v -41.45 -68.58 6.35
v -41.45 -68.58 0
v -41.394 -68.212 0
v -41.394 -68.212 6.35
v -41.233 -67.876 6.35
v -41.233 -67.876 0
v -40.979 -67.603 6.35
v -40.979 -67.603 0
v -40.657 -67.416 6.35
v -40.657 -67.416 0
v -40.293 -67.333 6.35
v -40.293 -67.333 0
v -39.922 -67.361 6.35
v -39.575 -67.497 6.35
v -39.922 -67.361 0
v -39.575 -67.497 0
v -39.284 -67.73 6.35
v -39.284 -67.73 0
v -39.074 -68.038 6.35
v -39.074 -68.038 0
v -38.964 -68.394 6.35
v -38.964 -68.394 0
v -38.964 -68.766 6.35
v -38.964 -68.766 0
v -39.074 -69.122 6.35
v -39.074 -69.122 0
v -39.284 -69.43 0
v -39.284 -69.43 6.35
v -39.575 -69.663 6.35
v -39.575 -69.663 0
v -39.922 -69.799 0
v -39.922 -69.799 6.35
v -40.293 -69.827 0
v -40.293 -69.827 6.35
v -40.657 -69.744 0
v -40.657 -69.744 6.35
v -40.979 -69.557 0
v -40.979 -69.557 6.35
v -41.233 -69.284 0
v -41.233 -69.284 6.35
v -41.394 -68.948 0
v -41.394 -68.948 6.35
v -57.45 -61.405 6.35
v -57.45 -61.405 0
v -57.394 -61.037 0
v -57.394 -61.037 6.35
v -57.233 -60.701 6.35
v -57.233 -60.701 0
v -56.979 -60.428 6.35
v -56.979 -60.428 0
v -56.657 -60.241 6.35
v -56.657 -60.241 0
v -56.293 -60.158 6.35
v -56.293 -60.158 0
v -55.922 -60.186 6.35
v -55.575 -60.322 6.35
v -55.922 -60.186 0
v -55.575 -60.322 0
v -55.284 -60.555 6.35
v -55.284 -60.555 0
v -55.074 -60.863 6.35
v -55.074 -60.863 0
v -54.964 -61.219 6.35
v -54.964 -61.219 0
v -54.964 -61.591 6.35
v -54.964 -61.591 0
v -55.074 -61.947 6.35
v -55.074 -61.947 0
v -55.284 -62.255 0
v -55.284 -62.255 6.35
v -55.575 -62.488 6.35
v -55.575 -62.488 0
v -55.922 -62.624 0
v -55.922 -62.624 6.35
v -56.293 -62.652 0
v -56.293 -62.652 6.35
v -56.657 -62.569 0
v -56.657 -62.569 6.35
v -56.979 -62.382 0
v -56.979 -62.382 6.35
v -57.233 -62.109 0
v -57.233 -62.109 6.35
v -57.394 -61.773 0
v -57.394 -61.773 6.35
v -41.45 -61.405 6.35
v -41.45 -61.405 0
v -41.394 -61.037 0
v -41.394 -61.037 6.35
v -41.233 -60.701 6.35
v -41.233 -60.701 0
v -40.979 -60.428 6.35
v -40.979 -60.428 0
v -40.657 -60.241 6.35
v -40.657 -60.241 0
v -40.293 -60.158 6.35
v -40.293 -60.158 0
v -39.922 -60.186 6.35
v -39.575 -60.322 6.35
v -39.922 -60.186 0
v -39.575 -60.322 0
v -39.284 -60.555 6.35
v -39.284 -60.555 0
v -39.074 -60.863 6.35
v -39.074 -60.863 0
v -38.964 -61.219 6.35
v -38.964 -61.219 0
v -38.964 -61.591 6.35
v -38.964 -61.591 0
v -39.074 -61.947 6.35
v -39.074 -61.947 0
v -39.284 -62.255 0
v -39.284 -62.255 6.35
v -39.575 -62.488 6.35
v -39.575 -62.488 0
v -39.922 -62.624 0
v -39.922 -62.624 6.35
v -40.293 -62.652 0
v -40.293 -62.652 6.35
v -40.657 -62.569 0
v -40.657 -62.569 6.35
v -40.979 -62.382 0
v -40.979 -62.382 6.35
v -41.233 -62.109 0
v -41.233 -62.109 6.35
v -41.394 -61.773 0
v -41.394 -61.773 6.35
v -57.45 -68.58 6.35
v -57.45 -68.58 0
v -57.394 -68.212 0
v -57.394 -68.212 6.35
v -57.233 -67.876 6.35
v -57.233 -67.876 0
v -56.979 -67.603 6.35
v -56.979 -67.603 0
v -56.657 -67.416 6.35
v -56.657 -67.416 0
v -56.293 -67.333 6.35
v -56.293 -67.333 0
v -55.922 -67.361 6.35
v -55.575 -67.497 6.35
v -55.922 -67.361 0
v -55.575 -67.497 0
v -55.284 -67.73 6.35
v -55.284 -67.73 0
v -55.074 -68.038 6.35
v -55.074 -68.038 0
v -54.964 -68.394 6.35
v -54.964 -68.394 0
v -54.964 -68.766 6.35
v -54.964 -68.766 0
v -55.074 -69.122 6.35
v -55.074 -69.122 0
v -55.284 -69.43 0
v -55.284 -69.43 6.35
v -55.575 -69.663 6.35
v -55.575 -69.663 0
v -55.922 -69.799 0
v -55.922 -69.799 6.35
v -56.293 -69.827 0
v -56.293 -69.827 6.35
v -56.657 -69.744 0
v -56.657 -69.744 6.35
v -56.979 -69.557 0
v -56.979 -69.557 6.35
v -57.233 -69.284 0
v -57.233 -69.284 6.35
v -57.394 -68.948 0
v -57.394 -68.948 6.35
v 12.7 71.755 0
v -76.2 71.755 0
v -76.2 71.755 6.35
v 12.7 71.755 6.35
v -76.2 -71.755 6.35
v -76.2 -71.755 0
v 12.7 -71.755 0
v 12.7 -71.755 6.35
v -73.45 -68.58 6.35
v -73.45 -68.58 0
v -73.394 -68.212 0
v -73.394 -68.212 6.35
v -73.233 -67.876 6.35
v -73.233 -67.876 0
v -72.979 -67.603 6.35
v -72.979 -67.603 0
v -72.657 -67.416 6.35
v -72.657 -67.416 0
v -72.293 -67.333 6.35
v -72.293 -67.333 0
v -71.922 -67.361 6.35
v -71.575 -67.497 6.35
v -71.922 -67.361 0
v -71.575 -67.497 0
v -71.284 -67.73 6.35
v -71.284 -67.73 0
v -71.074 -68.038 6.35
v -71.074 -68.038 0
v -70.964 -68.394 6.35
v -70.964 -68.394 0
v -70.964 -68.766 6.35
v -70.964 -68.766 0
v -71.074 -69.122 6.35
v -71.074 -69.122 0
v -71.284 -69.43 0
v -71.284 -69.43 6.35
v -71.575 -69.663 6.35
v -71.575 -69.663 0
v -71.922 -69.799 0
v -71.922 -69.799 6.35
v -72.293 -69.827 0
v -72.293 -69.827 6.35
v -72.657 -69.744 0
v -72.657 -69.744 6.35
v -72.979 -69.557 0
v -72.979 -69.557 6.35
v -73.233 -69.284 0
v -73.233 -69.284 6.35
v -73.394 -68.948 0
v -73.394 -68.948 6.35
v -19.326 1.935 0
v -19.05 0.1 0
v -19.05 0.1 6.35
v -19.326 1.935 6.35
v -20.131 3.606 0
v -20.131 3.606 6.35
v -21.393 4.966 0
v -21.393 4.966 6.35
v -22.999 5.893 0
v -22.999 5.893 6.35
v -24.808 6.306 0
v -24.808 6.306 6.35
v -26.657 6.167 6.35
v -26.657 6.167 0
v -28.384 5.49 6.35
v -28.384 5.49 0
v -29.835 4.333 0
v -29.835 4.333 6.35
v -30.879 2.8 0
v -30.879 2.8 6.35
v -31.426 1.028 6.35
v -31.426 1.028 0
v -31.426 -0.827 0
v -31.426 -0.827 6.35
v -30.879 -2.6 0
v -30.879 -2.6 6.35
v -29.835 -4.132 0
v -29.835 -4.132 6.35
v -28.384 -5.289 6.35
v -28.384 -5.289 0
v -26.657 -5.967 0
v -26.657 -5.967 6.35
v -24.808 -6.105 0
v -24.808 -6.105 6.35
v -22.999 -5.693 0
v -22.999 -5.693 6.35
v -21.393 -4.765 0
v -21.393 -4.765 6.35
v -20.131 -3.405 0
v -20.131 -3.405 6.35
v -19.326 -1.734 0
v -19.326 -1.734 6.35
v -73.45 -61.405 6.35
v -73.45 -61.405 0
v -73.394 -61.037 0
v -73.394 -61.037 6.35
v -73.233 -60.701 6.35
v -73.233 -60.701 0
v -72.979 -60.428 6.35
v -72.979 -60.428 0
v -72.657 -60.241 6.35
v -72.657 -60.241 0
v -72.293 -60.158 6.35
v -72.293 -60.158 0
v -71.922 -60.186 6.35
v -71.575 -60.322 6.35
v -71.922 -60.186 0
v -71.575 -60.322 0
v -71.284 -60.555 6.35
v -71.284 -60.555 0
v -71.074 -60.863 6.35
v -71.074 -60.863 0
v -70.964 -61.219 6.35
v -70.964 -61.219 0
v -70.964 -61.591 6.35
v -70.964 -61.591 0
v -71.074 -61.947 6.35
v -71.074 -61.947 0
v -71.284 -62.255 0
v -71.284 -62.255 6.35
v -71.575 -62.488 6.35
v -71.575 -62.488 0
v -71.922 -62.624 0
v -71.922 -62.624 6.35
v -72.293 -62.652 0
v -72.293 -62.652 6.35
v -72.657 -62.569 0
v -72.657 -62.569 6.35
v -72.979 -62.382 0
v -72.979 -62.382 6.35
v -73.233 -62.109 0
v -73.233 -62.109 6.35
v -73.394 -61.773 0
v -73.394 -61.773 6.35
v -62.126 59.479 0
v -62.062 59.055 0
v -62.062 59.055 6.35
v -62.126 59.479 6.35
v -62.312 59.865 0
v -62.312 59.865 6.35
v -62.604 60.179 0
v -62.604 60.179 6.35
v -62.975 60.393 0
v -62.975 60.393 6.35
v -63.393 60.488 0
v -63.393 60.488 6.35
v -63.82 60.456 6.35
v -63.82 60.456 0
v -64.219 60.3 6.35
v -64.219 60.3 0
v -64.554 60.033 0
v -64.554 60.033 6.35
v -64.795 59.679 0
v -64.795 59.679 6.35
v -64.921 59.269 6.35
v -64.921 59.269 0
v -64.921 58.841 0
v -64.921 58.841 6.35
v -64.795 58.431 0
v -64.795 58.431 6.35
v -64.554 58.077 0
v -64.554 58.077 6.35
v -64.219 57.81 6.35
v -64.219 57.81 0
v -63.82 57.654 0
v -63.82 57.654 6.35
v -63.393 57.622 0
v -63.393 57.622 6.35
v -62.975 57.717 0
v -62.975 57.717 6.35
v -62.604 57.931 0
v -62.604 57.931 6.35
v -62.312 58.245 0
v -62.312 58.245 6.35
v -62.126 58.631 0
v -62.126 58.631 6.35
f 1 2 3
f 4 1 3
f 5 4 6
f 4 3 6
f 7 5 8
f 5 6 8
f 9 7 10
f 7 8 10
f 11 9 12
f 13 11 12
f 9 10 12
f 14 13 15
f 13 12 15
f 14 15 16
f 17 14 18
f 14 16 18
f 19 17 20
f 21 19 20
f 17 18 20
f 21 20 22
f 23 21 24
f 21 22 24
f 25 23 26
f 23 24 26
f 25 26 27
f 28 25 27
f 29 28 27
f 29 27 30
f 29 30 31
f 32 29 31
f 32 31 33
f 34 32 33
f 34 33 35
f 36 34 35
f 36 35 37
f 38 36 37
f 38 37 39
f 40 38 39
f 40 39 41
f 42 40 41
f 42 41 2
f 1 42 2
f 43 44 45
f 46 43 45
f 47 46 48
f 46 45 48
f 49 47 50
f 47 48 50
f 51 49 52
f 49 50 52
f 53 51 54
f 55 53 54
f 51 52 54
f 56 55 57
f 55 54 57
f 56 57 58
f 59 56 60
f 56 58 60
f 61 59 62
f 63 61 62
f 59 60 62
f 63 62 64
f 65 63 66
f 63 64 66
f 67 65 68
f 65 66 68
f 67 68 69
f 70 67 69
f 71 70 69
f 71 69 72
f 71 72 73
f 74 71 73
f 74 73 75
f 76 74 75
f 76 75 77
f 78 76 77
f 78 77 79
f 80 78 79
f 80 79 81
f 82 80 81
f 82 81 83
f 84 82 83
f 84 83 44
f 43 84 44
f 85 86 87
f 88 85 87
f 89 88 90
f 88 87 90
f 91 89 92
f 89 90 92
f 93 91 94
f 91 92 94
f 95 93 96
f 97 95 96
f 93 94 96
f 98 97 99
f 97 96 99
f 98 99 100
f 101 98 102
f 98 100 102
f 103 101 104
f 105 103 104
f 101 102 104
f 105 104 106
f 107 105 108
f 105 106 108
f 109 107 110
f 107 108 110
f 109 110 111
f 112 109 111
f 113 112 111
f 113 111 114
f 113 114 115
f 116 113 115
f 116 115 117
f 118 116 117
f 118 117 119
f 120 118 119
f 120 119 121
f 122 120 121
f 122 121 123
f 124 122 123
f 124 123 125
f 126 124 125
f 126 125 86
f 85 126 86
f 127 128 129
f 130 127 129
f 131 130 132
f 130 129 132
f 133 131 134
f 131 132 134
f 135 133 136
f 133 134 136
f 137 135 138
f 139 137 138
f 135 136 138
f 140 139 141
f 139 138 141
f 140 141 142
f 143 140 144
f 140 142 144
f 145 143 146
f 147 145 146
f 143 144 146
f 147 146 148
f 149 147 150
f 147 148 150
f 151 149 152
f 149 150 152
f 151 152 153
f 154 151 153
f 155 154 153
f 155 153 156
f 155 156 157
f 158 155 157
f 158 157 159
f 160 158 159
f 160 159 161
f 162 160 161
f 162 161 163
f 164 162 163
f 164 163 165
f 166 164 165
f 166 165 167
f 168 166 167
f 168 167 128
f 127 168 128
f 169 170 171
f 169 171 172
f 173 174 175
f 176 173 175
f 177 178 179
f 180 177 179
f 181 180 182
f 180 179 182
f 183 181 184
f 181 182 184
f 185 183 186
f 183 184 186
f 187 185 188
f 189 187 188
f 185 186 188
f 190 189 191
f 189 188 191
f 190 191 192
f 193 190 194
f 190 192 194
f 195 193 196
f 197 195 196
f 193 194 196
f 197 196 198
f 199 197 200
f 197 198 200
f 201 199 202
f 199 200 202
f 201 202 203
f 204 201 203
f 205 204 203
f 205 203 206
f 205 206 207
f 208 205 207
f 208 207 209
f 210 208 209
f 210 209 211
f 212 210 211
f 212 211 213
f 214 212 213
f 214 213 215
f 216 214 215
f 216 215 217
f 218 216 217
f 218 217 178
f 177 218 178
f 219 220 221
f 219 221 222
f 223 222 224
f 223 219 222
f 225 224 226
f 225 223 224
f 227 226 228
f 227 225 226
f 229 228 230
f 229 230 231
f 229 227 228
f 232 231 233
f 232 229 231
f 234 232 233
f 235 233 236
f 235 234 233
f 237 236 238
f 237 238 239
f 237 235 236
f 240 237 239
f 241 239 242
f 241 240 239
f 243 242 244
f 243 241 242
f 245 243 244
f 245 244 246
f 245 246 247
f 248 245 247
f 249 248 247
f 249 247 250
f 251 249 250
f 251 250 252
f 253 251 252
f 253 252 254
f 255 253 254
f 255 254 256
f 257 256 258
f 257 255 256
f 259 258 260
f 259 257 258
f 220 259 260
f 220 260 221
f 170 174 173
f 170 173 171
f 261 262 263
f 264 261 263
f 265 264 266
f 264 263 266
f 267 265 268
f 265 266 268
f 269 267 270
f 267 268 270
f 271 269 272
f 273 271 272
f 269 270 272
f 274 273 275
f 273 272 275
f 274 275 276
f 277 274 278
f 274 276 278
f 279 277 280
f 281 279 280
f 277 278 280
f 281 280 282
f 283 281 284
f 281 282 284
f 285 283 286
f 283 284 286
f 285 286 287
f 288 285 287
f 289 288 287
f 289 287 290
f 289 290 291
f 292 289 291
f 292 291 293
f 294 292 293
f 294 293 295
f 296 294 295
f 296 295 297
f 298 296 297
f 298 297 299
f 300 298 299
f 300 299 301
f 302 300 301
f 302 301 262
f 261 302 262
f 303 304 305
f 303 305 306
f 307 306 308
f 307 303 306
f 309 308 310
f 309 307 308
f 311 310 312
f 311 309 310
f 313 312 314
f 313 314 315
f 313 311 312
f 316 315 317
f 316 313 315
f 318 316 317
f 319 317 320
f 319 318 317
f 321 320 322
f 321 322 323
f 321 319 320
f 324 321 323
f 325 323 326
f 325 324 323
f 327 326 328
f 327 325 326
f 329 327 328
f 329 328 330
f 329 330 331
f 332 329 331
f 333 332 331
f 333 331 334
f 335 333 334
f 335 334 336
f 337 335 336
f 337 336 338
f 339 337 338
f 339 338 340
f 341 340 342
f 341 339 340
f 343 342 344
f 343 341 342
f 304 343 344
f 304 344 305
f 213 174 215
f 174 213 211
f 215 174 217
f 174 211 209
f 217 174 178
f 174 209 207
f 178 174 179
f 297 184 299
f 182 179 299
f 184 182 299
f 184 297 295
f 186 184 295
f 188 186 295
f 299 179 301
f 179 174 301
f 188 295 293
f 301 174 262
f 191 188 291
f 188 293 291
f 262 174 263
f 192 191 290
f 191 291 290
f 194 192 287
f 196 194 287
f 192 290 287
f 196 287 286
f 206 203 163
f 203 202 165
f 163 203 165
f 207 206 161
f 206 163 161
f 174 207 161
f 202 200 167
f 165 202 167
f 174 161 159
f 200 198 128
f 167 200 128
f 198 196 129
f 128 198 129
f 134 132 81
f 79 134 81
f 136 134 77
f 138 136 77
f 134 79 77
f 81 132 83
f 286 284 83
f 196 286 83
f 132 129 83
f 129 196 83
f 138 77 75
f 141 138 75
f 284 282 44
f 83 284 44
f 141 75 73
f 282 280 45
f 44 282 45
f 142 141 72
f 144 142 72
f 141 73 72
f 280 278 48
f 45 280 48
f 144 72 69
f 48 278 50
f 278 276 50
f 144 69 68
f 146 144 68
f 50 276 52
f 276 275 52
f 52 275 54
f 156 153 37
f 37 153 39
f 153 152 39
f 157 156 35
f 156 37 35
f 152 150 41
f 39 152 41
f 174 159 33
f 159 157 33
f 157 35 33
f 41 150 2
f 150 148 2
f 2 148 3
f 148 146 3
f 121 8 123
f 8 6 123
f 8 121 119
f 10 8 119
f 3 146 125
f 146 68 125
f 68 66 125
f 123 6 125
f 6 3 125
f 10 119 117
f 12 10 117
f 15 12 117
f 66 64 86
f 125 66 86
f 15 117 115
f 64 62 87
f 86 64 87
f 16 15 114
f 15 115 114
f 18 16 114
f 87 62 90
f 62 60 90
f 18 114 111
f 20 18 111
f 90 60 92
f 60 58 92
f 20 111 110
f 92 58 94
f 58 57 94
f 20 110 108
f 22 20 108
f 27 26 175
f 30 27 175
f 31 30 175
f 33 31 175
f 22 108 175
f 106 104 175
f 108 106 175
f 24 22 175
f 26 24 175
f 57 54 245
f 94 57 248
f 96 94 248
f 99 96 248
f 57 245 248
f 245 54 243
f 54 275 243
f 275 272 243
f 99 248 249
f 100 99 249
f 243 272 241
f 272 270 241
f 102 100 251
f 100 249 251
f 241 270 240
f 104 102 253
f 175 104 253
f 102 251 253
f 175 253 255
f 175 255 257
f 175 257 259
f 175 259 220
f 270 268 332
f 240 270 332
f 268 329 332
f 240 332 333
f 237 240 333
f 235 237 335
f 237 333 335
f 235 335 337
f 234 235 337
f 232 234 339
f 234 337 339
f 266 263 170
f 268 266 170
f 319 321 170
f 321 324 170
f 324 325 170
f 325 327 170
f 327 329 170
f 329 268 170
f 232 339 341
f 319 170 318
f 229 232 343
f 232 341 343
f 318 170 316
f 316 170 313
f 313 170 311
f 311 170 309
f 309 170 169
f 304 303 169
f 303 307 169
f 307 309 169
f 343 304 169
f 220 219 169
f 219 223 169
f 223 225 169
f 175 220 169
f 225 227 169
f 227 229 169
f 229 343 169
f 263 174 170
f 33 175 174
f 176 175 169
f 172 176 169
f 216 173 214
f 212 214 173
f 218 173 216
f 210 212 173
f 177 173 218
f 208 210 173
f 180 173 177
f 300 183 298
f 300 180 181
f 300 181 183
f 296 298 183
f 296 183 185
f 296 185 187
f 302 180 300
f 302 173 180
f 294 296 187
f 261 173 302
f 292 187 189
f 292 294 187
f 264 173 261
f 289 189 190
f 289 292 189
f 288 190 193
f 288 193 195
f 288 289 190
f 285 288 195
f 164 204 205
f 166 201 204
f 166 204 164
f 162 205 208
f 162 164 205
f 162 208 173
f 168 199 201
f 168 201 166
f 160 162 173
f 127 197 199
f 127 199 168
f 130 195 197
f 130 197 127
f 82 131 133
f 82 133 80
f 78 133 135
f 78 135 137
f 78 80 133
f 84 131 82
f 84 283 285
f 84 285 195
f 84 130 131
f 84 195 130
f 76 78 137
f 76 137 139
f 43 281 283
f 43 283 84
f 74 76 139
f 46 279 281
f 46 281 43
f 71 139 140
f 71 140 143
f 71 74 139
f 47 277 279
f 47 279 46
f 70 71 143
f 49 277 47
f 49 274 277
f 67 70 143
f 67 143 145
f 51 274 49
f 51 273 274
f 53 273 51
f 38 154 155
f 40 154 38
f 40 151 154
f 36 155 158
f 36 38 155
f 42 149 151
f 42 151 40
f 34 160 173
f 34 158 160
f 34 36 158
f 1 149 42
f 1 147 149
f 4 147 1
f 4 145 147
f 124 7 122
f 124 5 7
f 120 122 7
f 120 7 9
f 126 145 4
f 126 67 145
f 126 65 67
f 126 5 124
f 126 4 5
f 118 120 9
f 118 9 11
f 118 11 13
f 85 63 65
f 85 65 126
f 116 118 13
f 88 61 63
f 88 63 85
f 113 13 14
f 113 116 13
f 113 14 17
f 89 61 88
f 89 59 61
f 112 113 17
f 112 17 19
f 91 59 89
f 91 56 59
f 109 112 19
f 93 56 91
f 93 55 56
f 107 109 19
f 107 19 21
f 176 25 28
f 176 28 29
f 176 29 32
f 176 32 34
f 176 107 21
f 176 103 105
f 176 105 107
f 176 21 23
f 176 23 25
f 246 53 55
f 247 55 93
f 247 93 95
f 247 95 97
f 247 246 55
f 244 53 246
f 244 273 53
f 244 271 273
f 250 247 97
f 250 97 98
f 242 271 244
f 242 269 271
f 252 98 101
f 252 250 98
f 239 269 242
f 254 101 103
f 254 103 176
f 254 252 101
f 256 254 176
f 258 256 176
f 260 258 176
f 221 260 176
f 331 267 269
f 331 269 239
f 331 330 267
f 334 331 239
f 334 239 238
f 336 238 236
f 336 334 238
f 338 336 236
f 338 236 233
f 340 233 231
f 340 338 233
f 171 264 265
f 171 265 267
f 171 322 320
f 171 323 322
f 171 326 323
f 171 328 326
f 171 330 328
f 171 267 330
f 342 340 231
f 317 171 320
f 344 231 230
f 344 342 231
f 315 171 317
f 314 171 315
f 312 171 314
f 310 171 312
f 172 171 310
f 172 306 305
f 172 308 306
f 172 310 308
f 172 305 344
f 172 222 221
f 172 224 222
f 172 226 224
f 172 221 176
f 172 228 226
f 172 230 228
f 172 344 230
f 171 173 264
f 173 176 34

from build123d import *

# Parameters (mm, degrees)
SKETCH1_W           = 152.4
SKETCH1_H           = 143.51
SKETCH1_R           = 6.223
SKETCH1_R_2         = 1.4375
BOSS_EXTRUDE1_DEPTH = 6.35
SKETCH2_R           = 3.1115
CUT_EXTRUDE1_DEPTH  = 105.859632486
SKETCH4_R           = 1.625
CUT_EXTRUDE2_DEPTH  = 105.859632486
SKETCH5_W           = 63.5
SKETCH5_H           = 143.51
CUT_EXTRUDE3_DEPTH  = 105.859632486
SKETCH6_R           = 1.25
CUT_EXTRUDE4_DEPTH  = 105.859632486


with BuildPart() as part:
    # Sketch1 → Boss-Extrude1 (new body)
    with BuildSketch(Plane.XY):
        Rectangle(SKETCH1_W, SKETCH1_H)
        with Locations((-25.272725174, 0.100300785)):
            Circle(SKETCH1_R, mode=Mode.SUBTRACT)
        with Locations((-63.5, 59.055)):
            Circle(SKETCH1_R_2, mode=Mode.SUBTRACT)
    extrude(amount=BOSS_EXTRUDE1_DEPTH)

    # Sketch2 → Cut-Extrude1 (cut, through all)
    with BuildSketch(Plane.XY.offset(6.35)):
        with Locations((63.5, 11.600300785)):
            Circle(SKETCH2_R)
    extrude(amount=-CUT_EXTRUDE1_DEPTH, mode=Mode.SUBTRACT)

    # Sketch4 → Cut-Extrude2 (cut, through all)
    with BuildSketch(Plane.XY.offset(6.35)):
        with Locations((43.849064669, -5.274915009)):
            Circle(SKETCH4_R)
        with Locations((43.849064669, -21.274915009)):
            Circle(SKETCH4_R)
        with Locations((43.849064669, -37.274915009)):
            Circle(SKETCH4_R)
        with Locations((43.849064669, 10.725084991)):
            Circle(SKETCH4_R)
    extrude(amount=-CUT_EXTRUDE2_DEPTH, mode=Mode.SUBTRACT)

    # Sketch5 → Cut-Extrude3 (cut, through all)
    with BuildSketch(Plane(origin=(0, 0, 0), x_dir=(-1, 0, 0), z_dir=(0, 0, -1))):
        with Locations((-44.45, 0)):
            Rectangle(SKETCH5_W, SKETCH5_H)
    extrude(amount=-CUT_EXTRUDE3_DEPTH, mode=Mode.SUBTRACT)

    # Sketch6 → Cut-Extrude4 (cut, through all)
    with BuildSketch(Plane(origin=(0, 0, 0), x_dir=(-1, 0, 0), z_dir=(0, 0, -1))):
        with Locations((72.2, -61.404999872)):
            Circle(SKETCH6_R)
        with Locations((56.2, -61.404999872)):
            Circle(SKETCH6_R)
        with Locations((40.2, -61.404999872)):
            Circle(SKETCH6_R)
        with Locations((72.2, -68.58)):
            Circle(SKETCH6_R)
        with Locations((56.2, -68.58)):
            Circle(SKETCH6_R)
        with Locations((40.2, -68.58)):
            Circle(SKETCH6_R)
    extrude(amount=-CUT_EXTRUDE4_DEPTH, mode=Mode.SUBTRACT)


solid = part.part
